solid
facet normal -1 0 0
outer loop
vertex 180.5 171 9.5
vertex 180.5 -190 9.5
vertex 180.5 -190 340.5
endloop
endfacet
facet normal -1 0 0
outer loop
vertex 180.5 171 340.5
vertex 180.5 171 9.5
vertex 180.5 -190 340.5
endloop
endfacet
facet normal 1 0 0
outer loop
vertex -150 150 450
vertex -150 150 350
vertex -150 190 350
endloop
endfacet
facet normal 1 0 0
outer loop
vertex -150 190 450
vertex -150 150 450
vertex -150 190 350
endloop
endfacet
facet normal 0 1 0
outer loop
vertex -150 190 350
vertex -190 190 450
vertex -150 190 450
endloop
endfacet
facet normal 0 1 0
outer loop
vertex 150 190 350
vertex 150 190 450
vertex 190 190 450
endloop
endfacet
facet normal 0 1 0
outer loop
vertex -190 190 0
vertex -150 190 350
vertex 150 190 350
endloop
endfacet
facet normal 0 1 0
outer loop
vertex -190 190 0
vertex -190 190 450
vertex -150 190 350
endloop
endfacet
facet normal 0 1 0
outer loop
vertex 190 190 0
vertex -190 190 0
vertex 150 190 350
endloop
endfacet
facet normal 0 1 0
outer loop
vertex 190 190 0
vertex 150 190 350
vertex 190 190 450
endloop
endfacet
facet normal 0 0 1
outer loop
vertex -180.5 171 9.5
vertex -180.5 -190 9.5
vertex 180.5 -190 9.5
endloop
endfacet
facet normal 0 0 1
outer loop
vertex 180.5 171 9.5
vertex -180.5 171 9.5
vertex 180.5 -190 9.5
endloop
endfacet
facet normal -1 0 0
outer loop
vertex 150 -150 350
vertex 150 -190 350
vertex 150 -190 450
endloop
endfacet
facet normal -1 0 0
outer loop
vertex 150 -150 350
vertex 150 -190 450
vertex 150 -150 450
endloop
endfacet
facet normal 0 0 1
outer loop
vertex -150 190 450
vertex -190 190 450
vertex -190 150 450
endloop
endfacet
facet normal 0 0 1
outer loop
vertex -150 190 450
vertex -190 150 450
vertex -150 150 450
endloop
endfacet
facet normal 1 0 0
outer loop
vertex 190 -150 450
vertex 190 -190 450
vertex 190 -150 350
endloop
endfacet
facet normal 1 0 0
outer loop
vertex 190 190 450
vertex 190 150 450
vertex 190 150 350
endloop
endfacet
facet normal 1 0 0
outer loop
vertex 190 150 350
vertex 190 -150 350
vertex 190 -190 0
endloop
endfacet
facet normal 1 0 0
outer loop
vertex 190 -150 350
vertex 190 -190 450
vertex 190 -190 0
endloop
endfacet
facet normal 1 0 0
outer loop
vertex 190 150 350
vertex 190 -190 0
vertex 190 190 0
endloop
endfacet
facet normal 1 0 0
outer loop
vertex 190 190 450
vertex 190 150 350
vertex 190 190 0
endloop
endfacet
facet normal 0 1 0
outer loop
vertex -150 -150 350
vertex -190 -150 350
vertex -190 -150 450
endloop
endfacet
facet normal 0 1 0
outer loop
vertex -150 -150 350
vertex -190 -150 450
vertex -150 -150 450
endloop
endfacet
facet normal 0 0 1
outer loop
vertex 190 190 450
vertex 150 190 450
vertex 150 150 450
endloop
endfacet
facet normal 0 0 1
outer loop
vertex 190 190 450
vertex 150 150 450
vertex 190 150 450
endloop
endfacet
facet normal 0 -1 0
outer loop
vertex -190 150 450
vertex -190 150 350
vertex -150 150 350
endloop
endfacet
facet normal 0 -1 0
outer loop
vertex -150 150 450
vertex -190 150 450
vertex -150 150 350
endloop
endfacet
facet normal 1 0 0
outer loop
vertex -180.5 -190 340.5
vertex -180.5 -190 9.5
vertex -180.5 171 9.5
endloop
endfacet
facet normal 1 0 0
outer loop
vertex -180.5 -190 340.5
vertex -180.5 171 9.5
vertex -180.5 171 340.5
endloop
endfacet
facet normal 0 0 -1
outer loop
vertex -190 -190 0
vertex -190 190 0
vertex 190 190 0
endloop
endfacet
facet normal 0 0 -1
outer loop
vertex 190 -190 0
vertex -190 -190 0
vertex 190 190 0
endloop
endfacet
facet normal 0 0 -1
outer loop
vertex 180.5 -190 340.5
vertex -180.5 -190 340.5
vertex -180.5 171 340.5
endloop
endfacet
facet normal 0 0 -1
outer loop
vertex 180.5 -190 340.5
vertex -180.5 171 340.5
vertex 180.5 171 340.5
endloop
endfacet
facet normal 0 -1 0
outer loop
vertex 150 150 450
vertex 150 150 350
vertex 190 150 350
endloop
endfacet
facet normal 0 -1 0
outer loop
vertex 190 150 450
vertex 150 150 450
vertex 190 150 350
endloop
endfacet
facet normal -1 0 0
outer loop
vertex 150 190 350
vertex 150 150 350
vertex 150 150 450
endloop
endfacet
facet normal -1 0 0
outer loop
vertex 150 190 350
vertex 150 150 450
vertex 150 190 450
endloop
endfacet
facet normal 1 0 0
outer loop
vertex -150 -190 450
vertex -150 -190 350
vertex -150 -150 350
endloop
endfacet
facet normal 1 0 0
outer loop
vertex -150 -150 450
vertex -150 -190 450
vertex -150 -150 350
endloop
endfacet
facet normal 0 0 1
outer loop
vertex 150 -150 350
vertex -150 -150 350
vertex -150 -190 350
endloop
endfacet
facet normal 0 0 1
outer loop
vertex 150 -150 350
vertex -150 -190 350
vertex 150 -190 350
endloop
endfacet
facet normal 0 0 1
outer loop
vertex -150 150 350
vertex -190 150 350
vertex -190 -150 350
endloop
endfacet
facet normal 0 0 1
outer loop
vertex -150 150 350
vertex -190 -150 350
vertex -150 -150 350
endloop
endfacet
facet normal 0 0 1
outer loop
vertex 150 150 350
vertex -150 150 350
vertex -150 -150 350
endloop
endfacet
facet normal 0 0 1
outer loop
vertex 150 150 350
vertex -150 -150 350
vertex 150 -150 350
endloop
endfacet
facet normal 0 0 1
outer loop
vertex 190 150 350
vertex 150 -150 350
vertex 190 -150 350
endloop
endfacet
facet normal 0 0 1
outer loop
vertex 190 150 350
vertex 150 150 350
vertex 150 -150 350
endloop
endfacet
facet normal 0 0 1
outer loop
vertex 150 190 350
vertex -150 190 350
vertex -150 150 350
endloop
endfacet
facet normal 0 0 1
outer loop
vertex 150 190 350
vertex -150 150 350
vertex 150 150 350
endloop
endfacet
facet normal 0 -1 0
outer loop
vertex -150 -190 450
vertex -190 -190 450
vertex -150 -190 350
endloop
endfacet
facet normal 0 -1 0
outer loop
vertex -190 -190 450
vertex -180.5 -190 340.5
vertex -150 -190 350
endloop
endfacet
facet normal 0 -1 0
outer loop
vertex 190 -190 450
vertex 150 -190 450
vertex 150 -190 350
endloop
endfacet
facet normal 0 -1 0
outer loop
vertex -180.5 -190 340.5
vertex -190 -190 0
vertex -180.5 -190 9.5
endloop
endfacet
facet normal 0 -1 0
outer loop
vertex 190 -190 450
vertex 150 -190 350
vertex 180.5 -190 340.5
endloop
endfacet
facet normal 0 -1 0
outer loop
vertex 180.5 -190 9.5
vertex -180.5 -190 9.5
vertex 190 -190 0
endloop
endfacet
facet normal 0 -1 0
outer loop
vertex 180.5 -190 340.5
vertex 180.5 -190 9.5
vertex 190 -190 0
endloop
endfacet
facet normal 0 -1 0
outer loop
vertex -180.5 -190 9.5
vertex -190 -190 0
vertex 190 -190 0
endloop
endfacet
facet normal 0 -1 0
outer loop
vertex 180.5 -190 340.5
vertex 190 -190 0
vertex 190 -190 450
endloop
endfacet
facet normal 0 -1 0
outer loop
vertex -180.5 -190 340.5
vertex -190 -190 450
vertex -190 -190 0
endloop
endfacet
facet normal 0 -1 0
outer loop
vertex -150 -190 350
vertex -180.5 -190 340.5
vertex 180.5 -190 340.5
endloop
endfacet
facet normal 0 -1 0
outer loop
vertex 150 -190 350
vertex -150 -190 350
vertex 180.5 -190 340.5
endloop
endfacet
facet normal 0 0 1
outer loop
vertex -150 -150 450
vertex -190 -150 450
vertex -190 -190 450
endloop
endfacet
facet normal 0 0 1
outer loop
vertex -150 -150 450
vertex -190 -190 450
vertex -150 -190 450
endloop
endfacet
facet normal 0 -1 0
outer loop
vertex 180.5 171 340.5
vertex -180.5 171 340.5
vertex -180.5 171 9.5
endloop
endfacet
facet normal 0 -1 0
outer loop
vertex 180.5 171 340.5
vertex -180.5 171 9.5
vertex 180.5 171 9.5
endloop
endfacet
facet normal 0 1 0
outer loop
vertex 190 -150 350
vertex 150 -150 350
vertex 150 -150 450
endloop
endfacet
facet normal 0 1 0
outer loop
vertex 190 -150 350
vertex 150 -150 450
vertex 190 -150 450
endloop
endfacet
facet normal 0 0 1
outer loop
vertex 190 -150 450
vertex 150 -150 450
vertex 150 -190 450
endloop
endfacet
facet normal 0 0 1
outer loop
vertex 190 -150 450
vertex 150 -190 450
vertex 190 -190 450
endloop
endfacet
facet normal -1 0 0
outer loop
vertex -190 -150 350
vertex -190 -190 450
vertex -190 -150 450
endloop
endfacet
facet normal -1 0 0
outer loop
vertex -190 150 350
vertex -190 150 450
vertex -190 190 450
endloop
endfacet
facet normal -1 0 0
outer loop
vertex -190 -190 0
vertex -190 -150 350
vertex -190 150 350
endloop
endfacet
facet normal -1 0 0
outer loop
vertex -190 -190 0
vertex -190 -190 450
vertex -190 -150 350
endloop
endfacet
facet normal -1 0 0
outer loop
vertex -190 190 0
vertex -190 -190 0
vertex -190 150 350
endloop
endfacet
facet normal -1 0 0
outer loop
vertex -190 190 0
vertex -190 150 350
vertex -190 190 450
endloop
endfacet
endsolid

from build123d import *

# Parameters (mm, degrees)
F0_W     = 380
F0_H     = 380
F1_DEPTH = 350
F2_W     = 361
F2_H     = 331
F3_DEPTH = 361
F4_W     = 40
F4_H     = 40
F5_DEPTH = 100
F6_W     = 40
F6_H     = 40
F7_DEPTH = 100


with BuildPart() as f1:
    # F0 (on Top) → F1 (new body)
    with BuildSketch(Plane.XY):
        Rectangle(F0_W, F0_H)
    extrude(amount=F1_DEPTH)

    # F2 (on face) → F3 (cut)
    with BuildSketch(Plane.XZ.offset(190)):
        with Locations((0, 175)):
            Rectangle(F2_W, F2_H)
    extrude(amount=-F3_DEPTH, mode=Mode.SUBTRACT)

    # F4 (on face) → F5 (join)
    with BuildSketch(Plane.XY.offset(350)):
        with Locations((-170, 170)):
            Rectangle(F4_W, F4_H)
        with Locations((170, 170)):
            Rectangle(F4_W, F4_H)
    extrude(amount=F5_DEPTH)

    # F6 (on face) → F7 (join)
    with BuildSketch(Plane.XY.offset(350)):
        with Locations((-170, -170)):
            Rectangle(F6_W, F6_H)
        with Locations((170, -170)):
            Rectangle(F6_W, F6_H)
    extrude(amount=F7_DEPTH)


solid = f1.part
